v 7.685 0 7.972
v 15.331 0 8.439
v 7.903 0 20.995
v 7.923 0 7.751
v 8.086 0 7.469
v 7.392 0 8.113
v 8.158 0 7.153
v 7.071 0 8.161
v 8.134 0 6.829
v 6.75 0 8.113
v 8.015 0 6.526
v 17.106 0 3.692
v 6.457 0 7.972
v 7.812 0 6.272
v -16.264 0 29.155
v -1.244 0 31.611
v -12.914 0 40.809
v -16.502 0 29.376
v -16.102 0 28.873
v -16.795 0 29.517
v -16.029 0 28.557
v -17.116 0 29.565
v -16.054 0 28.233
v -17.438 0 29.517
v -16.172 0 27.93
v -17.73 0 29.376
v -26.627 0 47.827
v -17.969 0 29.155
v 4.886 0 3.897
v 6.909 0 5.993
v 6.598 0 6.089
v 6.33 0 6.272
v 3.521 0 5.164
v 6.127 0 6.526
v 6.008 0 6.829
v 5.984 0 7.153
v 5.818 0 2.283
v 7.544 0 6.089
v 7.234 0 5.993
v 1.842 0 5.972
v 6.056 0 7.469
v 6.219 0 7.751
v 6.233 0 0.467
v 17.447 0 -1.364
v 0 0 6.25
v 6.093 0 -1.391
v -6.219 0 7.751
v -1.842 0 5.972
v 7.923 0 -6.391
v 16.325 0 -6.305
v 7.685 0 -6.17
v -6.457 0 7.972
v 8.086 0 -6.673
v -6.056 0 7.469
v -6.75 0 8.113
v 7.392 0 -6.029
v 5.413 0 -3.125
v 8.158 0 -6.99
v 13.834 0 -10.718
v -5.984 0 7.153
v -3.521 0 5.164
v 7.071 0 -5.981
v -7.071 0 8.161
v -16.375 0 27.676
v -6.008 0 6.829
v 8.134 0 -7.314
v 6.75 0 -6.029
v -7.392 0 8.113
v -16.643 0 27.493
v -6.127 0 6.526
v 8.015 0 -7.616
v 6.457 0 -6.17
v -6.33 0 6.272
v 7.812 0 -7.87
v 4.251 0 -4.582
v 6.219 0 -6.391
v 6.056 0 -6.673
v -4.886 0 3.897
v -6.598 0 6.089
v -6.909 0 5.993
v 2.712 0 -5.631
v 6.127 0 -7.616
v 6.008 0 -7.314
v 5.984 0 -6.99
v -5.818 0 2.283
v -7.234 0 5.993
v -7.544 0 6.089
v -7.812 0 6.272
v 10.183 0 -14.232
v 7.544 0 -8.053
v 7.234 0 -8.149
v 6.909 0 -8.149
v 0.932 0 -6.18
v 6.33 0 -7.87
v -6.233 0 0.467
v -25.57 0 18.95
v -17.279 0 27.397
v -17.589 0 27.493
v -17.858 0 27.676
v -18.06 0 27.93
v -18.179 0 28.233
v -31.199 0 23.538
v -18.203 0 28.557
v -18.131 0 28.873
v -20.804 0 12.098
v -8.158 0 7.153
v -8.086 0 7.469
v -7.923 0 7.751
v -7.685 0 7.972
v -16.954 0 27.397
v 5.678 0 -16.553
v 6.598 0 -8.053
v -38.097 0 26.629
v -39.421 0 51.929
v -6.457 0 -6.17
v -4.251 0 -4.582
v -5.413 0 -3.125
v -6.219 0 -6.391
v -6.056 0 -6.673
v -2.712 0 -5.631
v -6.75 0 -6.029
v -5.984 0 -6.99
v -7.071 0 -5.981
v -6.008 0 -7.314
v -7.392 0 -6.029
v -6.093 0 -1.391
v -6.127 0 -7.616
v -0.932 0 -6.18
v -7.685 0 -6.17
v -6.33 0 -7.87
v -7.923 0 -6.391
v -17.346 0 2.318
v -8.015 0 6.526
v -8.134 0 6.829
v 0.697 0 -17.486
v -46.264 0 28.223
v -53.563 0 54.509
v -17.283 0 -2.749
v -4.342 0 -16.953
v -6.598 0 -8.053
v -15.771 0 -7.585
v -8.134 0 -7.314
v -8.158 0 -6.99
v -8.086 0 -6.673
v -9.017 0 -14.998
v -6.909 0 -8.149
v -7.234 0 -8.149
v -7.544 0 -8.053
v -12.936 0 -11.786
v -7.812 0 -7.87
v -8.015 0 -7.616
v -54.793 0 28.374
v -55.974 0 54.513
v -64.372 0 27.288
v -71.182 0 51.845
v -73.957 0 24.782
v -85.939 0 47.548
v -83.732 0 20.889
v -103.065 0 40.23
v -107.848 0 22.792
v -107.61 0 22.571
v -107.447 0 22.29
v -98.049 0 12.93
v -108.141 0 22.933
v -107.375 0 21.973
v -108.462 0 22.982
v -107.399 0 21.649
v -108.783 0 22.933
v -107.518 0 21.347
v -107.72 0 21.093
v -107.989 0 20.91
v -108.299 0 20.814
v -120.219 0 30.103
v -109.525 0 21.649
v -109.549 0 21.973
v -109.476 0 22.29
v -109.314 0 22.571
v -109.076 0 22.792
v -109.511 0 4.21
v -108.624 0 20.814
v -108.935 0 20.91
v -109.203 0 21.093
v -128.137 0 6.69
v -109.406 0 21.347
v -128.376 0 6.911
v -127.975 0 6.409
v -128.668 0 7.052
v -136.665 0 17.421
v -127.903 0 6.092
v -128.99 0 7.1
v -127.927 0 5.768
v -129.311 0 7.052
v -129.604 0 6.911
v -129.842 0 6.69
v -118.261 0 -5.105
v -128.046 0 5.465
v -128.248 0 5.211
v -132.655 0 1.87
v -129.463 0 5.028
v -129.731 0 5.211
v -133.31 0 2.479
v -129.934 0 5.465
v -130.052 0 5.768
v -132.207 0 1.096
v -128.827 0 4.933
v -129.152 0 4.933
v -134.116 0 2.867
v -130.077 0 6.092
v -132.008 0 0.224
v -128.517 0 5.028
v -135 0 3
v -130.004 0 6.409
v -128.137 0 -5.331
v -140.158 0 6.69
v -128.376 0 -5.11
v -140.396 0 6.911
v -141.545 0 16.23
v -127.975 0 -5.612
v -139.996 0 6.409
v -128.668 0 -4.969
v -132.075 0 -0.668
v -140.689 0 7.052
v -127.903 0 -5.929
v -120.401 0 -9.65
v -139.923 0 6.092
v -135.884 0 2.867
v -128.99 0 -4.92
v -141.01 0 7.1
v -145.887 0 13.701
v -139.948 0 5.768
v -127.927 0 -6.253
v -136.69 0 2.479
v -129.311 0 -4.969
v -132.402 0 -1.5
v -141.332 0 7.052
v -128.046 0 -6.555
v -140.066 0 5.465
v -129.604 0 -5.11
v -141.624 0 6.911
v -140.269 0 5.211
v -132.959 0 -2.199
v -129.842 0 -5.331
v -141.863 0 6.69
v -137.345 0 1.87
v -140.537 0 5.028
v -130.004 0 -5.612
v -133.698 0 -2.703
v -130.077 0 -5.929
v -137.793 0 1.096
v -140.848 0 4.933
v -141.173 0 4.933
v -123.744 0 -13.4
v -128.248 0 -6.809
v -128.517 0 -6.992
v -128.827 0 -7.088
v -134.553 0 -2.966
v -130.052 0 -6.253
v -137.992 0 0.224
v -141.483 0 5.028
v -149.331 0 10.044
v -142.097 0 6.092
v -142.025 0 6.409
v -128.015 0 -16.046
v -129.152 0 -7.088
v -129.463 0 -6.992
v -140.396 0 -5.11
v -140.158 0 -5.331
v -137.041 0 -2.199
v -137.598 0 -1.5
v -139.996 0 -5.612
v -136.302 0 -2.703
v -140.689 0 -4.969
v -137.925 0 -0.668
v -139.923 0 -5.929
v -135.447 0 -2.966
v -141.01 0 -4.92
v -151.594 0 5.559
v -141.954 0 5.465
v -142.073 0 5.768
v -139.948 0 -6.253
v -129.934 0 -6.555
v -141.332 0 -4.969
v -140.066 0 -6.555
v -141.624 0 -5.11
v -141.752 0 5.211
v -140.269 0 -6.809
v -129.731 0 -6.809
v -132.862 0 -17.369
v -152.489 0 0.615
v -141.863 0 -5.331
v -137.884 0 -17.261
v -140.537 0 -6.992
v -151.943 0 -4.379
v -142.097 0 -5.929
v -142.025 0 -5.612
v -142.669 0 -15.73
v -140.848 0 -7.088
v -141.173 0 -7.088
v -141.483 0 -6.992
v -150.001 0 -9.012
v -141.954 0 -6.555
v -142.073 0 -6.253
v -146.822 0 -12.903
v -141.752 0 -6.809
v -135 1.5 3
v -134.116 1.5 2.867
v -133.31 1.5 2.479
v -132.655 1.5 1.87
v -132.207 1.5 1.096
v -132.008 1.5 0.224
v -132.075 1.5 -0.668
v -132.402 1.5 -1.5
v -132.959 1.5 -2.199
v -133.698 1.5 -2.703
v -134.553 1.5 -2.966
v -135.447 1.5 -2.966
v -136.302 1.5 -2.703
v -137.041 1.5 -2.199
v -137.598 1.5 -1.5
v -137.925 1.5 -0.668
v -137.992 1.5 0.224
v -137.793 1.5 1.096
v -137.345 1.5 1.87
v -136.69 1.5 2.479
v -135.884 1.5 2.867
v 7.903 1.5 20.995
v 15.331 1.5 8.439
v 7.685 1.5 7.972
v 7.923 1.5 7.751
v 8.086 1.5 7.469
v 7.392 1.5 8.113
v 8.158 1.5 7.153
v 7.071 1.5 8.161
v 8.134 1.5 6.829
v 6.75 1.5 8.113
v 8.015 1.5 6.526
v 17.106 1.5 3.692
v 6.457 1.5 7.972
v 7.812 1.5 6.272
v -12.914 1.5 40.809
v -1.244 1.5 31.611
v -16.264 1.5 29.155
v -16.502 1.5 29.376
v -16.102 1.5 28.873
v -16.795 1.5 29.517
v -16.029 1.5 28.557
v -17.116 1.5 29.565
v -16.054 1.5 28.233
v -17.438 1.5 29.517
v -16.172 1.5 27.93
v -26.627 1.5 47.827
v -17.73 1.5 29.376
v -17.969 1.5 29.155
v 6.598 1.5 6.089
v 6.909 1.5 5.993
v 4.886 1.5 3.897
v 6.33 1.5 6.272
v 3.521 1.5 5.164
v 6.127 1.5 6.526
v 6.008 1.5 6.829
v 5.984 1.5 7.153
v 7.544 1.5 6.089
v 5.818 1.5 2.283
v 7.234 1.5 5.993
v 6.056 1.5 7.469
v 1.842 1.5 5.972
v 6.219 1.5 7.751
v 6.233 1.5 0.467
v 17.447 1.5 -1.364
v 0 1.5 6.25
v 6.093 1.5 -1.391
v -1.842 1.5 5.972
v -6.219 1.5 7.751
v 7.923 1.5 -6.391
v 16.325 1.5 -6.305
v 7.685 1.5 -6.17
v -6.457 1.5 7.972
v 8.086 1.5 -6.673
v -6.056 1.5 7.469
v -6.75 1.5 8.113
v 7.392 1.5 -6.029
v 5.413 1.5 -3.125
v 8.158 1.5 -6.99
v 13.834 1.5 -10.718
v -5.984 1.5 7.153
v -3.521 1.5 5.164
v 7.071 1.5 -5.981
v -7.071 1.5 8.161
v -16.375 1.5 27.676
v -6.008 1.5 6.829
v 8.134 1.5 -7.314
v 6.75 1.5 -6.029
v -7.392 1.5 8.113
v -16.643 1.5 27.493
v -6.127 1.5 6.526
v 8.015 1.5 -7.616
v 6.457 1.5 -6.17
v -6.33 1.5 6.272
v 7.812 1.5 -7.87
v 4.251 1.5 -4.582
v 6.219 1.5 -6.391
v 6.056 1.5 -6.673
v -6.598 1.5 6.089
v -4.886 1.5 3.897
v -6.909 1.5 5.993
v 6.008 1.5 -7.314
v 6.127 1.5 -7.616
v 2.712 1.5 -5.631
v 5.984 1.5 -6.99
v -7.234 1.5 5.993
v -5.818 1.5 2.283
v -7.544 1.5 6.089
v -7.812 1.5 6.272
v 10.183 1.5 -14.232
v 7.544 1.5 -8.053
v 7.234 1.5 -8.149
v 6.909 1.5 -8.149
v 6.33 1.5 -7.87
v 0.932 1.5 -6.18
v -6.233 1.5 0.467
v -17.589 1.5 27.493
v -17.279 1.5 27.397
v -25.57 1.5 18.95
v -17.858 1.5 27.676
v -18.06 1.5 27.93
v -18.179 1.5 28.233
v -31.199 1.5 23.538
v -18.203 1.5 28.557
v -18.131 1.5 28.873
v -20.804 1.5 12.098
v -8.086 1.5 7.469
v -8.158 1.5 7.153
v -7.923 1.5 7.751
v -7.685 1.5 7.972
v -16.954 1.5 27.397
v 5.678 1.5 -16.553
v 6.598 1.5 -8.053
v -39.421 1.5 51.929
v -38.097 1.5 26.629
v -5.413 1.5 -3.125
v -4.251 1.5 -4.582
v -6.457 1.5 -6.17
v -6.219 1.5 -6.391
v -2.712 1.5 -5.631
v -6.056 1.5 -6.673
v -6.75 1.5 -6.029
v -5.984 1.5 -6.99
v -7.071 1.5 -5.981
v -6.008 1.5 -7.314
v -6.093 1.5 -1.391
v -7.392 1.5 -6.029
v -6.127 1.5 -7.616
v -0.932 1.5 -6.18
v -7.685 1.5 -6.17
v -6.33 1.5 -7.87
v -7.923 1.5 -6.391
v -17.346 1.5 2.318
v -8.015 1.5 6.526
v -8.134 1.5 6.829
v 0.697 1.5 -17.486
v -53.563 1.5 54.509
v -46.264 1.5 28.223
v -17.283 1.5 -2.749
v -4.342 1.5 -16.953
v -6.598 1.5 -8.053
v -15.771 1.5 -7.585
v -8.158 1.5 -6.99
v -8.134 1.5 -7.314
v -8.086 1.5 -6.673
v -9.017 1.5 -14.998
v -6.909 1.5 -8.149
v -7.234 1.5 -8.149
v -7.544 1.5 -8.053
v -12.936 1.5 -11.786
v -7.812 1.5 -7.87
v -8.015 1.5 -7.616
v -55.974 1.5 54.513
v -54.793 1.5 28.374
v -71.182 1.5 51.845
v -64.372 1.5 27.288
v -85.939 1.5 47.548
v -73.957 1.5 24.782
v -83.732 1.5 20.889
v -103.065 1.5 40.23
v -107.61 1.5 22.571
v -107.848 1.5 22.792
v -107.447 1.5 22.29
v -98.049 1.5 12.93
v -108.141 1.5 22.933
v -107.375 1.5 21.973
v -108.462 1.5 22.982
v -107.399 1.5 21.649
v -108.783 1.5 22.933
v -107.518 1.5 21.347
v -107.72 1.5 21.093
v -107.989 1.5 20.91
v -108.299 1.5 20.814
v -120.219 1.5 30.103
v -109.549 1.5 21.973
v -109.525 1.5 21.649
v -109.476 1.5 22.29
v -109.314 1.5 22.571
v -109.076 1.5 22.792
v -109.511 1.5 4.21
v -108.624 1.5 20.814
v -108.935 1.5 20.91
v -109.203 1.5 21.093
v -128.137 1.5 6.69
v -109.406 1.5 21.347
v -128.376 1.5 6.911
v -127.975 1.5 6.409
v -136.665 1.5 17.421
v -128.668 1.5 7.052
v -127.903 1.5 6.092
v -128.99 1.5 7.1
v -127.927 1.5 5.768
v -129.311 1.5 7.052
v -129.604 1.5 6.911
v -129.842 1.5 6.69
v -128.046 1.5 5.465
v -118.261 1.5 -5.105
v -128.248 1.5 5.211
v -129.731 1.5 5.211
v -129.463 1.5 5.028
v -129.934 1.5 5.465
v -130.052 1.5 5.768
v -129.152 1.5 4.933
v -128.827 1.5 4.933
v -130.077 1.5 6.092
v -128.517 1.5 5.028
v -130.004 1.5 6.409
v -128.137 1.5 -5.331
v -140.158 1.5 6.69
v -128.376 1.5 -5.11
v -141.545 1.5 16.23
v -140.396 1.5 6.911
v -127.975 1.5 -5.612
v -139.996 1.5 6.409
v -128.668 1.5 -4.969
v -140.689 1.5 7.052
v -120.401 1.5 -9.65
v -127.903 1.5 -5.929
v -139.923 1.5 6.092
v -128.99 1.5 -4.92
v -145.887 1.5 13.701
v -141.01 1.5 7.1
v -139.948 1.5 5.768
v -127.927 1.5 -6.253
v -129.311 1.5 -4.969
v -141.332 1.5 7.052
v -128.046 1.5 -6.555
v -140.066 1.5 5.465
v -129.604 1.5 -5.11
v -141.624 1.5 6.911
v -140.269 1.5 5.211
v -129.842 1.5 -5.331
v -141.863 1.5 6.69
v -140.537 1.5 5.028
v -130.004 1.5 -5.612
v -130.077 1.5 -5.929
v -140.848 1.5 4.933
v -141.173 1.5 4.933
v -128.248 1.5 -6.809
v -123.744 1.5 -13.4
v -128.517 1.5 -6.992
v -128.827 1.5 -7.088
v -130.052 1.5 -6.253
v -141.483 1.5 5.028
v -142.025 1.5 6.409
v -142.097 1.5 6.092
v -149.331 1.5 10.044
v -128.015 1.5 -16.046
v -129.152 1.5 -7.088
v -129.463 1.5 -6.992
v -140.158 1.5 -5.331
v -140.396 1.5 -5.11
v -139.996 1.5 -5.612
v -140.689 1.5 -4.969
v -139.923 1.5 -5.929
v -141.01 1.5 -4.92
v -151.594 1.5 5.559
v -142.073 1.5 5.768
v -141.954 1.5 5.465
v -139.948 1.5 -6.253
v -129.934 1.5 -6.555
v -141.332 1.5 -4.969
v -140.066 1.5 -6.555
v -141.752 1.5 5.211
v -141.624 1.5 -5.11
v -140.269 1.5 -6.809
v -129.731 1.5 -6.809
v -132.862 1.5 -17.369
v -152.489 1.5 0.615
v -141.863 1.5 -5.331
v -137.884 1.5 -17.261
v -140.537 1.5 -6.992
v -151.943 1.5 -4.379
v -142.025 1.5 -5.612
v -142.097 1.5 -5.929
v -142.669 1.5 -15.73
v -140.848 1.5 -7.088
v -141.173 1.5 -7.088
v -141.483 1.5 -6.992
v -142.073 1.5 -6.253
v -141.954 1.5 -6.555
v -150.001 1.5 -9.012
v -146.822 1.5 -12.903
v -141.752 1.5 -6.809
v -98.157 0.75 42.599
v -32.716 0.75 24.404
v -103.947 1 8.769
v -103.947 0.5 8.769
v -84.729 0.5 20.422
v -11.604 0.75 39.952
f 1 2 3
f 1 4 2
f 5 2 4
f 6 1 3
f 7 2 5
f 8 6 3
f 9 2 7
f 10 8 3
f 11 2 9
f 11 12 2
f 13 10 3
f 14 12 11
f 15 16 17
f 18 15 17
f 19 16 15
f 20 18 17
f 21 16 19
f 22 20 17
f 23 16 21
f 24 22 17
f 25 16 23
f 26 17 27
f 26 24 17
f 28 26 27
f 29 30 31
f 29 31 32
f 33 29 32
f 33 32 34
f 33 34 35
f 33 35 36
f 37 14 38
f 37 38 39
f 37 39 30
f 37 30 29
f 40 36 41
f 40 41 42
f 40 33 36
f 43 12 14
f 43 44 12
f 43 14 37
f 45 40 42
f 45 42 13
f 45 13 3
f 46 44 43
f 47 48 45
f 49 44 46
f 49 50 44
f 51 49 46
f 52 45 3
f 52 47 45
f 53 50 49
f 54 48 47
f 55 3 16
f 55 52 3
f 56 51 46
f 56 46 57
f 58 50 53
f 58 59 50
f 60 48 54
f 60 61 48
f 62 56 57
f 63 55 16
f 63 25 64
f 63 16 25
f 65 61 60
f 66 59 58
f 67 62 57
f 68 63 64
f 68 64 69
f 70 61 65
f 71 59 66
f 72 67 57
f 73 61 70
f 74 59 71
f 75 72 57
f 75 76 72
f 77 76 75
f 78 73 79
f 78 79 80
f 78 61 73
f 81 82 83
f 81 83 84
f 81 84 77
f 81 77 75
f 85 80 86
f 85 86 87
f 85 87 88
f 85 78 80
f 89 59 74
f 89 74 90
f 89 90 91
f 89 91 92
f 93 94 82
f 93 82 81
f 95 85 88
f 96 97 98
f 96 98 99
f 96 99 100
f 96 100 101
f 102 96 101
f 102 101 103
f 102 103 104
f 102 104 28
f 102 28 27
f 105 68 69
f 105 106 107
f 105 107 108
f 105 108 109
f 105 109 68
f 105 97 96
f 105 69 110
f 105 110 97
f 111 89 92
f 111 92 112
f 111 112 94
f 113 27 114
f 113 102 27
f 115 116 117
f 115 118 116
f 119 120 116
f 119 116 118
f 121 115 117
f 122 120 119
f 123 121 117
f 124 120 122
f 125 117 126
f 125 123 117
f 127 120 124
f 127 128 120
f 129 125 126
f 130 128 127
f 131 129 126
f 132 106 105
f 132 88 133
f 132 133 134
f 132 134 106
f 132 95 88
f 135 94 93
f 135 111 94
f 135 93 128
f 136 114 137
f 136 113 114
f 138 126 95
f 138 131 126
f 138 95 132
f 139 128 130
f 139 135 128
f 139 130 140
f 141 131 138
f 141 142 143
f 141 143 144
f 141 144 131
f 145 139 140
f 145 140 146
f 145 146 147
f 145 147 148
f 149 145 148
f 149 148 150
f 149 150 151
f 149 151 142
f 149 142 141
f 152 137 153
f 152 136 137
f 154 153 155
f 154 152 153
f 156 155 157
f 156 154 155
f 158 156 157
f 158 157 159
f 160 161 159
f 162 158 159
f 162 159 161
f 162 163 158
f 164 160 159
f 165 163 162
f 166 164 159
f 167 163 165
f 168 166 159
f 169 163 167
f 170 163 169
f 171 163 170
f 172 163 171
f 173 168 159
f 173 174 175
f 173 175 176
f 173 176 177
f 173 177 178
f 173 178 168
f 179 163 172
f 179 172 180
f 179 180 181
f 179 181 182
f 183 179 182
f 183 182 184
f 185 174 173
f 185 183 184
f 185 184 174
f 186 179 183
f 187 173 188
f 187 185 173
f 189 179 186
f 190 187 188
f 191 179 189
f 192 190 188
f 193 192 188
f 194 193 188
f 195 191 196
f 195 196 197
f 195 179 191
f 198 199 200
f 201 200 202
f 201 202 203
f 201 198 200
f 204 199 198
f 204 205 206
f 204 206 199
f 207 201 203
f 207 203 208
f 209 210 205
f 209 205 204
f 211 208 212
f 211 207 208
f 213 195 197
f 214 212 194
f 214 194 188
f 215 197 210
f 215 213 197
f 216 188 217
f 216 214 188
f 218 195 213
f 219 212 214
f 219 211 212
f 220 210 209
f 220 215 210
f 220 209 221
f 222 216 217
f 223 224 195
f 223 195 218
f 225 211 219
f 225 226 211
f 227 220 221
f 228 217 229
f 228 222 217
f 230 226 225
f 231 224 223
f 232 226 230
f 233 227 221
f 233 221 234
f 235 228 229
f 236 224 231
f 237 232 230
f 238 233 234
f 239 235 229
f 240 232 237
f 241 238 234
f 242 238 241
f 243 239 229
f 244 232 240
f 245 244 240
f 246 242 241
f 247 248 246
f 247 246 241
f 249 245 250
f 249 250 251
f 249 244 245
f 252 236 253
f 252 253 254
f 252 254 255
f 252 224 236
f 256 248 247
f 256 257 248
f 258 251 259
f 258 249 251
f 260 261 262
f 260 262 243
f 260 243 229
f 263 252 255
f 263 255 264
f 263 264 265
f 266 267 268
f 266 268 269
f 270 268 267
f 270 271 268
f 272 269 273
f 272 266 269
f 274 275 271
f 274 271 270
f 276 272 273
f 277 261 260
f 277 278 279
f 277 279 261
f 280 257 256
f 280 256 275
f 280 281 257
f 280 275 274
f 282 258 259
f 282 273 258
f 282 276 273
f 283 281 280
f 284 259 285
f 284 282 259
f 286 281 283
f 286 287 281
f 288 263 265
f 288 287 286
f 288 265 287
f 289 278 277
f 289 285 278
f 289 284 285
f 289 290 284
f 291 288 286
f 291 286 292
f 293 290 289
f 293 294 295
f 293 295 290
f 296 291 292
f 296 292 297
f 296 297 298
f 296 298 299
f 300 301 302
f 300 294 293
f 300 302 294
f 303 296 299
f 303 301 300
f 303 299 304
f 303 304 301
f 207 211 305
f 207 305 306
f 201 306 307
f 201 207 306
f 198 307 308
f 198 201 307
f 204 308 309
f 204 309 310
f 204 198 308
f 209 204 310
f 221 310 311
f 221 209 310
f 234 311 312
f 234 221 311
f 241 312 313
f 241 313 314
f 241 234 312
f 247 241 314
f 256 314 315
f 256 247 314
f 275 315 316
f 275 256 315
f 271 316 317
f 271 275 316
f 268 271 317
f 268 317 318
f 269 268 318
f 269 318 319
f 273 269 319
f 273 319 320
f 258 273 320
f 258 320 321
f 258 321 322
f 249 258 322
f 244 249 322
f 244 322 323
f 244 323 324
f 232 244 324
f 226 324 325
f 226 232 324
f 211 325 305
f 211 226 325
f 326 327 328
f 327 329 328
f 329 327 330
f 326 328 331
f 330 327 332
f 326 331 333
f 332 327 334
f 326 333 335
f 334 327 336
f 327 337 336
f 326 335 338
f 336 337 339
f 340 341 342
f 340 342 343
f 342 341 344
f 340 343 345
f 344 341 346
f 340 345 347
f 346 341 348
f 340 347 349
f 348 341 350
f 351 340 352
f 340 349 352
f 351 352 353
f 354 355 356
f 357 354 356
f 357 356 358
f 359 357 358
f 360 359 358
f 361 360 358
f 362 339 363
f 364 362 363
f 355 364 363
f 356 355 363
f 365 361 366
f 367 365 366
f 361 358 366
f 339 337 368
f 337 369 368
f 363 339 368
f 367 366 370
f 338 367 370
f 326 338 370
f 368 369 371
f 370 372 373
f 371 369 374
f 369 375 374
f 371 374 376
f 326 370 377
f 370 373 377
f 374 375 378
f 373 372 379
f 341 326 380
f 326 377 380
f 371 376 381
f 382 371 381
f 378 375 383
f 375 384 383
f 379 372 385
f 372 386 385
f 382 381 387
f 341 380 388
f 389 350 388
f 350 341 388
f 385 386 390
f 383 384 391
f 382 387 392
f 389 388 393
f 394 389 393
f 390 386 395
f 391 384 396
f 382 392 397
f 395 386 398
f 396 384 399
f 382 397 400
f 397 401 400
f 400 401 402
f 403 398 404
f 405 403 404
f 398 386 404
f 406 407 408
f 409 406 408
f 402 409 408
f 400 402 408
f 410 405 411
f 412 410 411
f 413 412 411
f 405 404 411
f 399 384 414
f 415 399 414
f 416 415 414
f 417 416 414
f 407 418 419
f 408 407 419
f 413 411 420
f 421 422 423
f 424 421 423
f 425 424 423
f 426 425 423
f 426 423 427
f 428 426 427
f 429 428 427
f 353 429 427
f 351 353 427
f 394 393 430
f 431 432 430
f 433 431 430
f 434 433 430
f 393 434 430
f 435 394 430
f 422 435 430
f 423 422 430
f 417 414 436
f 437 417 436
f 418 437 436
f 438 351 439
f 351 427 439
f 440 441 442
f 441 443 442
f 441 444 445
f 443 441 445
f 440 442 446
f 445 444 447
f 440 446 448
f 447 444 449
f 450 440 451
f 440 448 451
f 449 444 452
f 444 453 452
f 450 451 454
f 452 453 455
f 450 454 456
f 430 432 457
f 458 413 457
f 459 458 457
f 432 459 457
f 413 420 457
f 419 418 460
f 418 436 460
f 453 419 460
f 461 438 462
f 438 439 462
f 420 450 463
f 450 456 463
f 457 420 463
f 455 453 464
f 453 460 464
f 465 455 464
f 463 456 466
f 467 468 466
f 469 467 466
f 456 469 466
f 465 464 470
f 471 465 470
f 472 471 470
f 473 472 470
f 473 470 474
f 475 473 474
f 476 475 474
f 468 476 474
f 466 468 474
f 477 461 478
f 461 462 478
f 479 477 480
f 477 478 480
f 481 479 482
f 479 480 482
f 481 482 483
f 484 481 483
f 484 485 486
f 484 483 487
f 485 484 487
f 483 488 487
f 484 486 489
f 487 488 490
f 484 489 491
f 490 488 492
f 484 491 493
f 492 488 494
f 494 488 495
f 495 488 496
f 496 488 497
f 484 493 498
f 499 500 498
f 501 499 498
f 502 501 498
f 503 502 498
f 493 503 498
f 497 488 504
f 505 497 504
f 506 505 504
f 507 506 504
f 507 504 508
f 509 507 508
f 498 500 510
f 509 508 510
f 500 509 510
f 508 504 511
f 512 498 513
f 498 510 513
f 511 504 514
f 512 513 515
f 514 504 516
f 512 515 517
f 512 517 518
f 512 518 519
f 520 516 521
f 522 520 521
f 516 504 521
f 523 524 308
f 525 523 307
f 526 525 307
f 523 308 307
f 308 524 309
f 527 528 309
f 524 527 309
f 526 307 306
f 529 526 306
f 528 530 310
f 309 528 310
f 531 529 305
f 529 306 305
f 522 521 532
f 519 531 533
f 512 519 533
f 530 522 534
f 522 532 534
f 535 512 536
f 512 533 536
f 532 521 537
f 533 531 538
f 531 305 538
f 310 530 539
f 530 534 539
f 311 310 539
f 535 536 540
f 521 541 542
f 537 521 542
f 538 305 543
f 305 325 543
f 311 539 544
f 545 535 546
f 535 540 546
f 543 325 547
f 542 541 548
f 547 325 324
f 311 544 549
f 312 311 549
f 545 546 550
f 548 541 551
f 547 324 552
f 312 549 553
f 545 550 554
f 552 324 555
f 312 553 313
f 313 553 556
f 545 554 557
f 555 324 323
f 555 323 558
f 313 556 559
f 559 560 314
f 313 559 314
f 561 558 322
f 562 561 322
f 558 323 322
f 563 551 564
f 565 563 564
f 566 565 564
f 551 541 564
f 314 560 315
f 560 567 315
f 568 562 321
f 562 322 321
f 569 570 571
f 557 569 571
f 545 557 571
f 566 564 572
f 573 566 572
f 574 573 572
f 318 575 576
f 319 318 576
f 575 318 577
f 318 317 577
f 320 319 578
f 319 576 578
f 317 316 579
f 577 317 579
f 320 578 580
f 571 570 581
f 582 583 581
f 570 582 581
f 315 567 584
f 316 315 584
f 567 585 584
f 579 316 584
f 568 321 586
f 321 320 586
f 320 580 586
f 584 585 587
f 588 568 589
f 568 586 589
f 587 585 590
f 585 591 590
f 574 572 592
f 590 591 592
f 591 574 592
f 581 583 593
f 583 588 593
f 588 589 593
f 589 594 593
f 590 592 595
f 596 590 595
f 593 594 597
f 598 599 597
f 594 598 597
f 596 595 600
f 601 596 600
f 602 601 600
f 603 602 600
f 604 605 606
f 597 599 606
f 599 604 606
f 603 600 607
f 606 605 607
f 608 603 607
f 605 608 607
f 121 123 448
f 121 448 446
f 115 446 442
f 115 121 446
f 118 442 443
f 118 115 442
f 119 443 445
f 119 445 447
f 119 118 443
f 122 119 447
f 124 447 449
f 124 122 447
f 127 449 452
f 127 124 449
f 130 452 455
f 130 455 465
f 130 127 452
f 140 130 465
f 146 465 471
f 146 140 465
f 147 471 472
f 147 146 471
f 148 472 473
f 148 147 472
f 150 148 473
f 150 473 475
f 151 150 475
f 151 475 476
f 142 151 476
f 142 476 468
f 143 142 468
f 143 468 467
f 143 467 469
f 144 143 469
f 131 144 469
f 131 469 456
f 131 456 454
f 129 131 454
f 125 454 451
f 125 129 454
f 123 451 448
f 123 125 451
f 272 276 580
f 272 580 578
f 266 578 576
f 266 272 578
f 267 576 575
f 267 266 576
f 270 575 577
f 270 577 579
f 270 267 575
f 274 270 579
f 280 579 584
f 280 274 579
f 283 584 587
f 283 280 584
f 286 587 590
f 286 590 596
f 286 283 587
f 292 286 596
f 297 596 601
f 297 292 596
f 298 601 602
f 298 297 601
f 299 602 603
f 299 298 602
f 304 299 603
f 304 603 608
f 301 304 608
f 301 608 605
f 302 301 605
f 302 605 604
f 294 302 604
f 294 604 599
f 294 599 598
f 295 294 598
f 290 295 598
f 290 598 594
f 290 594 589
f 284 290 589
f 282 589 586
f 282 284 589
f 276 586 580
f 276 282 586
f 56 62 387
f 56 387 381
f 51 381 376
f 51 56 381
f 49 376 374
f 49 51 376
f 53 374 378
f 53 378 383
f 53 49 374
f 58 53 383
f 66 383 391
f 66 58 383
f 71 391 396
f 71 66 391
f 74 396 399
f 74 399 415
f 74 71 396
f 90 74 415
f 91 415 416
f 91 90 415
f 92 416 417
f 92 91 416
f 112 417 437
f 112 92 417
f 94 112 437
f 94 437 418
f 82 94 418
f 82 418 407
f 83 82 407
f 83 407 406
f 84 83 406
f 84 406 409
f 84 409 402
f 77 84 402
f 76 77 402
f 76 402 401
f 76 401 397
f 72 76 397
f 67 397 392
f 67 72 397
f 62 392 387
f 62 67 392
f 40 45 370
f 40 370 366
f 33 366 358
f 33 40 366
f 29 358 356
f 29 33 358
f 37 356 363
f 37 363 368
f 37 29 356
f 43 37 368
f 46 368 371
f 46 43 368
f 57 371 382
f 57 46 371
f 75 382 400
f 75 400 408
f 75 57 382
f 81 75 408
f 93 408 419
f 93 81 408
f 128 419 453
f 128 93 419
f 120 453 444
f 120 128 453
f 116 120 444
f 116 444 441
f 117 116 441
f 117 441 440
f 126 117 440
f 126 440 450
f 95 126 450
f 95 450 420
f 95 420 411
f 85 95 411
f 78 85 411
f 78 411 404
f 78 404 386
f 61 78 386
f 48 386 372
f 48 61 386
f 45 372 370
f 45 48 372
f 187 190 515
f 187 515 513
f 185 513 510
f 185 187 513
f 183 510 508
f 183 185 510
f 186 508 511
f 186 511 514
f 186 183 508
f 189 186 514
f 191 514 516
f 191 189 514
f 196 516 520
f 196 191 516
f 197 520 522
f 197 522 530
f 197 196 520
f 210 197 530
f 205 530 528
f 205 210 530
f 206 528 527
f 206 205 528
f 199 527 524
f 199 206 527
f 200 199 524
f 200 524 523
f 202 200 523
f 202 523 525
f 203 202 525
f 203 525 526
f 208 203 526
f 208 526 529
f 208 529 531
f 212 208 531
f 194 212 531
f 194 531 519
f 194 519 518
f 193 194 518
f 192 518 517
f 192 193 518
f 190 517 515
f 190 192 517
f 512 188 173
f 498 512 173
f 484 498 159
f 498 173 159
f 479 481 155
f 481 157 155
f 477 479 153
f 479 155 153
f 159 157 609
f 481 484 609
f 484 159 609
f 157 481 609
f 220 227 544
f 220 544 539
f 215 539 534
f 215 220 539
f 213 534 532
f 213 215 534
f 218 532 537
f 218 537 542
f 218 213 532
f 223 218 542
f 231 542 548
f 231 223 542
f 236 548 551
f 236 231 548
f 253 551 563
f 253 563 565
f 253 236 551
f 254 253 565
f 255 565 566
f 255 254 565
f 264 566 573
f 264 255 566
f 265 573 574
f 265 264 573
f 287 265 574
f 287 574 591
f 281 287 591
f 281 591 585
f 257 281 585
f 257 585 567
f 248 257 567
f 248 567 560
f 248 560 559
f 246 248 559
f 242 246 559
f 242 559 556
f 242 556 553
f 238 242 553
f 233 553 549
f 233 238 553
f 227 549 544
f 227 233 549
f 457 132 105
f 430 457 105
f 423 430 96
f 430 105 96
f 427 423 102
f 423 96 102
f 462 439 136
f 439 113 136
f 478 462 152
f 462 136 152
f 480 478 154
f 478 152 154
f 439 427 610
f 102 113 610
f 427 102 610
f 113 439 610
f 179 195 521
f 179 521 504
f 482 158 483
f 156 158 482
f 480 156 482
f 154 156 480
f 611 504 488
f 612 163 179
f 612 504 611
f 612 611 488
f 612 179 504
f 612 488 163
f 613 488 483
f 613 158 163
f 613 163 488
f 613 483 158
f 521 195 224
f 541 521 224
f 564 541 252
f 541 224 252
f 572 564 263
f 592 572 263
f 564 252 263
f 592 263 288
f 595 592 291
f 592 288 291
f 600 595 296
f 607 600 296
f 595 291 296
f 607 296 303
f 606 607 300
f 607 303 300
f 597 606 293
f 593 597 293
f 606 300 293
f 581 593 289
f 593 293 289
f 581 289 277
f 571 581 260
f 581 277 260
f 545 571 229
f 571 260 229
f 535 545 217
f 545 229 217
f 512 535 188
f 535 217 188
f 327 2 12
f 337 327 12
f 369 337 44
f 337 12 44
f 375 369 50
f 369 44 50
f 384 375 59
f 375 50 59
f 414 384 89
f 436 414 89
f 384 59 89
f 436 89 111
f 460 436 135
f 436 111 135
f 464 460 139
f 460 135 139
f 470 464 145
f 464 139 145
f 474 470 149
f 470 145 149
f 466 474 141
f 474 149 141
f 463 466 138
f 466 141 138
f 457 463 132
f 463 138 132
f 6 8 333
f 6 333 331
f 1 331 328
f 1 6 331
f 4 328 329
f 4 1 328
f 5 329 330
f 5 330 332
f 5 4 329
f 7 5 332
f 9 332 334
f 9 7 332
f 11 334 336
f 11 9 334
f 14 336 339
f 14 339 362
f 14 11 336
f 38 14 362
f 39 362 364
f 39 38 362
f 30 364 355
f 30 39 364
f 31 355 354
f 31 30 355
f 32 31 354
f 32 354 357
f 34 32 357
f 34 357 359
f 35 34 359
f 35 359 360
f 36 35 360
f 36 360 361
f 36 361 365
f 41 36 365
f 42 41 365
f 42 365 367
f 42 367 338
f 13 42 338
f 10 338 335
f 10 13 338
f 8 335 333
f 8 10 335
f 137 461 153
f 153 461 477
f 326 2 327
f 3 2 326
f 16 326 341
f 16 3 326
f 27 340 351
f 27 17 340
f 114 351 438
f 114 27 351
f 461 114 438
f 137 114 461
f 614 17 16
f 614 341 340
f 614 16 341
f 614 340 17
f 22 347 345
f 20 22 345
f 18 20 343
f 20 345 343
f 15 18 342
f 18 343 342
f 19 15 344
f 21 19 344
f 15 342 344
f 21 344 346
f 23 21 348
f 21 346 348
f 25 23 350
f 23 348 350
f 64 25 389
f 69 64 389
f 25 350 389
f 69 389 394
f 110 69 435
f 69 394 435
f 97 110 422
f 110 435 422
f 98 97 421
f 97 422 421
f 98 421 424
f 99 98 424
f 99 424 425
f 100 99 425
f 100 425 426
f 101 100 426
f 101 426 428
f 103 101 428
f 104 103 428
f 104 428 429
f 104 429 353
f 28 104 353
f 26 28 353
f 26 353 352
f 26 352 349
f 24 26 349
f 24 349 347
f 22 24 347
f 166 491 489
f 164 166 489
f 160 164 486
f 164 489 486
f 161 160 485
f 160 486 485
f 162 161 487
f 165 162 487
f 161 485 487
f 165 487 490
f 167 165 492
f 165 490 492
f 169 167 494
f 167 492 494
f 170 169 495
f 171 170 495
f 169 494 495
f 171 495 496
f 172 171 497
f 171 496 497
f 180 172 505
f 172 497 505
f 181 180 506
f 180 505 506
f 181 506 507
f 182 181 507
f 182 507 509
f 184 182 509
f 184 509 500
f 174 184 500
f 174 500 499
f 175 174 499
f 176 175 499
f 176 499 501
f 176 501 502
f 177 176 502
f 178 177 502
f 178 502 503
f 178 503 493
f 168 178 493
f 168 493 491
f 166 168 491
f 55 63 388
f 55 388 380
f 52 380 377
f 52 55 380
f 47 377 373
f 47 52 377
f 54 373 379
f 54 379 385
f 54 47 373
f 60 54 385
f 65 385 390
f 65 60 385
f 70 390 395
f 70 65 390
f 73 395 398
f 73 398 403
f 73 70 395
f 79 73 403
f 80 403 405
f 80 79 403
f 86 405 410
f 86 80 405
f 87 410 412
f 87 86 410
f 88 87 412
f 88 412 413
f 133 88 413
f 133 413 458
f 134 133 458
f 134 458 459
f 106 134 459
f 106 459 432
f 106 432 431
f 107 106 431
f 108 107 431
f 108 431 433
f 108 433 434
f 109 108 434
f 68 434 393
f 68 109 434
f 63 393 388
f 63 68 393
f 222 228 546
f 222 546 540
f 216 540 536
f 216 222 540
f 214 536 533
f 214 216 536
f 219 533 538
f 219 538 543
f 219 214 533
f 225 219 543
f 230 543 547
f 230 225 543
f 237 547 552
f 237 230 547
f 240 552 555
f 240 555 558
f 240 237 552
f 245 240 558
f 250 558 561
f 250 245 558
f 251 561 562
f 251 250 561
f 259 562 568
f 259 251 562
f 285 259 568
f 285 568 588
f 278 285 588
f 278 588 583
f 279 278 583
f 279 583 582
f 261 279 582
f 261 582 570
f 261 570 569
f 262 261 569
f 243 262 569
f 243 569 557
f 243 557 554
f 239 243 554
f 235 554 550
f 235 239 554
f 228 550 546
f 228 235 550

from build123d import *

# Parameters (mm, degrees)
SKETCH2_R           = 1.09
SKETCH2_R_2         = 3
SKETCH2_R_3         = 6.25
BOSS_EXTRUDE1_DEPTH = 1.5
FILLET1_R           = 10
SKETCH3_R           = 1.09
CUT_EXTRUDE1_DEPTH  = 10


with BuildPart() as part:
    # Sketch2 → Boss-Extrude1 (new body)
    with BuildSketch(Plane(origin=(0, 0, 0), x_dir=(1, 0, 0), z_dir=(0, 1, 0))):
        with BuildLine():
            add(Edge.make_bspline(
                [(15.330967743, -8.438686395), (-4.328656702, -48.917065398), (-54.77019988, -54.651995587)],
                knots=[0, 0, 0, 1, 1, 1], degree=2))
            ThreePointArc((15.330967743, -8.438686395), (3.221708095, 17.200889423), (-17.345753159, -2.318371704))
            add(Edge.make_bspline(
                [(-17.345753159, -2.318371704), (-24.57230847, -34.004755189), (-64.372079348, -27.287713928)],
                knots=[0, 0, 0, 1, 1, 1], degree=2))
            add(Edge.make_bspline(
                [(-118.261066558, 5.104714216), (-107.65521746, -9.024230402), (-84.042514499, -23.671917894), (-64.372079348, -27.287713928)],
                knots=[0, 0, 0, 0, 1, 1, 1, 1], degree=3))
            ThreePointArc((-118.261066558, 5.104714216), (-148.55197352, 11.072218102), (-136.664707239, -17.420641487))
            add(Edge.make_bspline(
                [(-136.664707239, -17.420641487), (-99.493020923, -49.665084924), (-54.77019988, -54.651995587)],
                knots=[0, 0, 0, 1, 1, 1], degree=2))
        make_face()
        with Locations(Location((-141.01040764, -6.01040764, 0), (0, 0, 270))):
            Circle(SKETCH2_R, mode=Mode.SUBTRACT)
        with Locations(Location((-128.98959236, -6.01040764, 0), (0, 0, 270))):
            Circle(SKETCH2_R, mode=Mode.SUBTRACT)
        with Locations(Location((-135, 0, 0), (0, 0, 270))):
            Circle(SKETCH2_R_2, mode=Mode.SUBTRACT)
        with Locations(Location((-141.01040764, 6.01040764, 0), (0, 0, 270))):
            Circle(SKETCH2_R, mode=Mode.SUBTRACT)
        with Locations(Location((-128.98959236, 6.01040764, 0), (0, 0, 270))):
            Circle(SKETCH2_R, mode=Mode.SUBTRACT)
        with Locations(Location((-7.071067812, -7.071067812, 0), (0, 0, 270))):
            Circle(SKETCH2_R, mode=Mode.SUBTRACT)
        with Locations(Location((7.071067812, -7.071067812, 0), (0, 0, 270))):
            Circle(SKETCH2_R, mode=Mode.SUBTRACT)
        with Locations(Location((-7.071067812, 7.071067812, 0), (0, 0, 270))):
            Circle(SKETCH2_R, mode=Mode.SUBTRACT)
        with Locations(Location((0, 0, 0), (0, 0, 270))):
            Circle(SKETCH2_R_3, mode=Mode.SUBTRACT)
        with Locations(Location((7.071067812, 7.071067812, 0), (0, 0, 270))):
            Circle(SKETCH2_R, mode=Mode.SUBTRACT)
    extrude(amount=BOSS_EXTRUDE1_DEPTH)

    # Fillet1
    fillet1_edges = [part.edges().sort_by_distance(p)[0] for p in [
        (-54.77019988, 0.75, 54.651995587),
    ]]
    fillet(fillet1_edges, radius=FILLET1_R)

    # Sketch3 → Cut-Extrude1 (cut)
    with BuildSketch(Plane(origin=(0, 1.5, 0), x_dir=(1, 0, 0), z_dir=(0, 1, 0))):
        with Locations(Location((-17.11634733, -28.475205037, 0), (0, 0, 270))):
            Circle(SKETCH3_R)
        with Locations(Location((-108.461839112, -21.891809685, 0), (0, 0, 270))):
            Circle(SKETCH3_R)
    extrude(amount=-CUT_EXTRUDE1_DEPTH, mode=Mode.SUBTRACT)


solid = part.part
